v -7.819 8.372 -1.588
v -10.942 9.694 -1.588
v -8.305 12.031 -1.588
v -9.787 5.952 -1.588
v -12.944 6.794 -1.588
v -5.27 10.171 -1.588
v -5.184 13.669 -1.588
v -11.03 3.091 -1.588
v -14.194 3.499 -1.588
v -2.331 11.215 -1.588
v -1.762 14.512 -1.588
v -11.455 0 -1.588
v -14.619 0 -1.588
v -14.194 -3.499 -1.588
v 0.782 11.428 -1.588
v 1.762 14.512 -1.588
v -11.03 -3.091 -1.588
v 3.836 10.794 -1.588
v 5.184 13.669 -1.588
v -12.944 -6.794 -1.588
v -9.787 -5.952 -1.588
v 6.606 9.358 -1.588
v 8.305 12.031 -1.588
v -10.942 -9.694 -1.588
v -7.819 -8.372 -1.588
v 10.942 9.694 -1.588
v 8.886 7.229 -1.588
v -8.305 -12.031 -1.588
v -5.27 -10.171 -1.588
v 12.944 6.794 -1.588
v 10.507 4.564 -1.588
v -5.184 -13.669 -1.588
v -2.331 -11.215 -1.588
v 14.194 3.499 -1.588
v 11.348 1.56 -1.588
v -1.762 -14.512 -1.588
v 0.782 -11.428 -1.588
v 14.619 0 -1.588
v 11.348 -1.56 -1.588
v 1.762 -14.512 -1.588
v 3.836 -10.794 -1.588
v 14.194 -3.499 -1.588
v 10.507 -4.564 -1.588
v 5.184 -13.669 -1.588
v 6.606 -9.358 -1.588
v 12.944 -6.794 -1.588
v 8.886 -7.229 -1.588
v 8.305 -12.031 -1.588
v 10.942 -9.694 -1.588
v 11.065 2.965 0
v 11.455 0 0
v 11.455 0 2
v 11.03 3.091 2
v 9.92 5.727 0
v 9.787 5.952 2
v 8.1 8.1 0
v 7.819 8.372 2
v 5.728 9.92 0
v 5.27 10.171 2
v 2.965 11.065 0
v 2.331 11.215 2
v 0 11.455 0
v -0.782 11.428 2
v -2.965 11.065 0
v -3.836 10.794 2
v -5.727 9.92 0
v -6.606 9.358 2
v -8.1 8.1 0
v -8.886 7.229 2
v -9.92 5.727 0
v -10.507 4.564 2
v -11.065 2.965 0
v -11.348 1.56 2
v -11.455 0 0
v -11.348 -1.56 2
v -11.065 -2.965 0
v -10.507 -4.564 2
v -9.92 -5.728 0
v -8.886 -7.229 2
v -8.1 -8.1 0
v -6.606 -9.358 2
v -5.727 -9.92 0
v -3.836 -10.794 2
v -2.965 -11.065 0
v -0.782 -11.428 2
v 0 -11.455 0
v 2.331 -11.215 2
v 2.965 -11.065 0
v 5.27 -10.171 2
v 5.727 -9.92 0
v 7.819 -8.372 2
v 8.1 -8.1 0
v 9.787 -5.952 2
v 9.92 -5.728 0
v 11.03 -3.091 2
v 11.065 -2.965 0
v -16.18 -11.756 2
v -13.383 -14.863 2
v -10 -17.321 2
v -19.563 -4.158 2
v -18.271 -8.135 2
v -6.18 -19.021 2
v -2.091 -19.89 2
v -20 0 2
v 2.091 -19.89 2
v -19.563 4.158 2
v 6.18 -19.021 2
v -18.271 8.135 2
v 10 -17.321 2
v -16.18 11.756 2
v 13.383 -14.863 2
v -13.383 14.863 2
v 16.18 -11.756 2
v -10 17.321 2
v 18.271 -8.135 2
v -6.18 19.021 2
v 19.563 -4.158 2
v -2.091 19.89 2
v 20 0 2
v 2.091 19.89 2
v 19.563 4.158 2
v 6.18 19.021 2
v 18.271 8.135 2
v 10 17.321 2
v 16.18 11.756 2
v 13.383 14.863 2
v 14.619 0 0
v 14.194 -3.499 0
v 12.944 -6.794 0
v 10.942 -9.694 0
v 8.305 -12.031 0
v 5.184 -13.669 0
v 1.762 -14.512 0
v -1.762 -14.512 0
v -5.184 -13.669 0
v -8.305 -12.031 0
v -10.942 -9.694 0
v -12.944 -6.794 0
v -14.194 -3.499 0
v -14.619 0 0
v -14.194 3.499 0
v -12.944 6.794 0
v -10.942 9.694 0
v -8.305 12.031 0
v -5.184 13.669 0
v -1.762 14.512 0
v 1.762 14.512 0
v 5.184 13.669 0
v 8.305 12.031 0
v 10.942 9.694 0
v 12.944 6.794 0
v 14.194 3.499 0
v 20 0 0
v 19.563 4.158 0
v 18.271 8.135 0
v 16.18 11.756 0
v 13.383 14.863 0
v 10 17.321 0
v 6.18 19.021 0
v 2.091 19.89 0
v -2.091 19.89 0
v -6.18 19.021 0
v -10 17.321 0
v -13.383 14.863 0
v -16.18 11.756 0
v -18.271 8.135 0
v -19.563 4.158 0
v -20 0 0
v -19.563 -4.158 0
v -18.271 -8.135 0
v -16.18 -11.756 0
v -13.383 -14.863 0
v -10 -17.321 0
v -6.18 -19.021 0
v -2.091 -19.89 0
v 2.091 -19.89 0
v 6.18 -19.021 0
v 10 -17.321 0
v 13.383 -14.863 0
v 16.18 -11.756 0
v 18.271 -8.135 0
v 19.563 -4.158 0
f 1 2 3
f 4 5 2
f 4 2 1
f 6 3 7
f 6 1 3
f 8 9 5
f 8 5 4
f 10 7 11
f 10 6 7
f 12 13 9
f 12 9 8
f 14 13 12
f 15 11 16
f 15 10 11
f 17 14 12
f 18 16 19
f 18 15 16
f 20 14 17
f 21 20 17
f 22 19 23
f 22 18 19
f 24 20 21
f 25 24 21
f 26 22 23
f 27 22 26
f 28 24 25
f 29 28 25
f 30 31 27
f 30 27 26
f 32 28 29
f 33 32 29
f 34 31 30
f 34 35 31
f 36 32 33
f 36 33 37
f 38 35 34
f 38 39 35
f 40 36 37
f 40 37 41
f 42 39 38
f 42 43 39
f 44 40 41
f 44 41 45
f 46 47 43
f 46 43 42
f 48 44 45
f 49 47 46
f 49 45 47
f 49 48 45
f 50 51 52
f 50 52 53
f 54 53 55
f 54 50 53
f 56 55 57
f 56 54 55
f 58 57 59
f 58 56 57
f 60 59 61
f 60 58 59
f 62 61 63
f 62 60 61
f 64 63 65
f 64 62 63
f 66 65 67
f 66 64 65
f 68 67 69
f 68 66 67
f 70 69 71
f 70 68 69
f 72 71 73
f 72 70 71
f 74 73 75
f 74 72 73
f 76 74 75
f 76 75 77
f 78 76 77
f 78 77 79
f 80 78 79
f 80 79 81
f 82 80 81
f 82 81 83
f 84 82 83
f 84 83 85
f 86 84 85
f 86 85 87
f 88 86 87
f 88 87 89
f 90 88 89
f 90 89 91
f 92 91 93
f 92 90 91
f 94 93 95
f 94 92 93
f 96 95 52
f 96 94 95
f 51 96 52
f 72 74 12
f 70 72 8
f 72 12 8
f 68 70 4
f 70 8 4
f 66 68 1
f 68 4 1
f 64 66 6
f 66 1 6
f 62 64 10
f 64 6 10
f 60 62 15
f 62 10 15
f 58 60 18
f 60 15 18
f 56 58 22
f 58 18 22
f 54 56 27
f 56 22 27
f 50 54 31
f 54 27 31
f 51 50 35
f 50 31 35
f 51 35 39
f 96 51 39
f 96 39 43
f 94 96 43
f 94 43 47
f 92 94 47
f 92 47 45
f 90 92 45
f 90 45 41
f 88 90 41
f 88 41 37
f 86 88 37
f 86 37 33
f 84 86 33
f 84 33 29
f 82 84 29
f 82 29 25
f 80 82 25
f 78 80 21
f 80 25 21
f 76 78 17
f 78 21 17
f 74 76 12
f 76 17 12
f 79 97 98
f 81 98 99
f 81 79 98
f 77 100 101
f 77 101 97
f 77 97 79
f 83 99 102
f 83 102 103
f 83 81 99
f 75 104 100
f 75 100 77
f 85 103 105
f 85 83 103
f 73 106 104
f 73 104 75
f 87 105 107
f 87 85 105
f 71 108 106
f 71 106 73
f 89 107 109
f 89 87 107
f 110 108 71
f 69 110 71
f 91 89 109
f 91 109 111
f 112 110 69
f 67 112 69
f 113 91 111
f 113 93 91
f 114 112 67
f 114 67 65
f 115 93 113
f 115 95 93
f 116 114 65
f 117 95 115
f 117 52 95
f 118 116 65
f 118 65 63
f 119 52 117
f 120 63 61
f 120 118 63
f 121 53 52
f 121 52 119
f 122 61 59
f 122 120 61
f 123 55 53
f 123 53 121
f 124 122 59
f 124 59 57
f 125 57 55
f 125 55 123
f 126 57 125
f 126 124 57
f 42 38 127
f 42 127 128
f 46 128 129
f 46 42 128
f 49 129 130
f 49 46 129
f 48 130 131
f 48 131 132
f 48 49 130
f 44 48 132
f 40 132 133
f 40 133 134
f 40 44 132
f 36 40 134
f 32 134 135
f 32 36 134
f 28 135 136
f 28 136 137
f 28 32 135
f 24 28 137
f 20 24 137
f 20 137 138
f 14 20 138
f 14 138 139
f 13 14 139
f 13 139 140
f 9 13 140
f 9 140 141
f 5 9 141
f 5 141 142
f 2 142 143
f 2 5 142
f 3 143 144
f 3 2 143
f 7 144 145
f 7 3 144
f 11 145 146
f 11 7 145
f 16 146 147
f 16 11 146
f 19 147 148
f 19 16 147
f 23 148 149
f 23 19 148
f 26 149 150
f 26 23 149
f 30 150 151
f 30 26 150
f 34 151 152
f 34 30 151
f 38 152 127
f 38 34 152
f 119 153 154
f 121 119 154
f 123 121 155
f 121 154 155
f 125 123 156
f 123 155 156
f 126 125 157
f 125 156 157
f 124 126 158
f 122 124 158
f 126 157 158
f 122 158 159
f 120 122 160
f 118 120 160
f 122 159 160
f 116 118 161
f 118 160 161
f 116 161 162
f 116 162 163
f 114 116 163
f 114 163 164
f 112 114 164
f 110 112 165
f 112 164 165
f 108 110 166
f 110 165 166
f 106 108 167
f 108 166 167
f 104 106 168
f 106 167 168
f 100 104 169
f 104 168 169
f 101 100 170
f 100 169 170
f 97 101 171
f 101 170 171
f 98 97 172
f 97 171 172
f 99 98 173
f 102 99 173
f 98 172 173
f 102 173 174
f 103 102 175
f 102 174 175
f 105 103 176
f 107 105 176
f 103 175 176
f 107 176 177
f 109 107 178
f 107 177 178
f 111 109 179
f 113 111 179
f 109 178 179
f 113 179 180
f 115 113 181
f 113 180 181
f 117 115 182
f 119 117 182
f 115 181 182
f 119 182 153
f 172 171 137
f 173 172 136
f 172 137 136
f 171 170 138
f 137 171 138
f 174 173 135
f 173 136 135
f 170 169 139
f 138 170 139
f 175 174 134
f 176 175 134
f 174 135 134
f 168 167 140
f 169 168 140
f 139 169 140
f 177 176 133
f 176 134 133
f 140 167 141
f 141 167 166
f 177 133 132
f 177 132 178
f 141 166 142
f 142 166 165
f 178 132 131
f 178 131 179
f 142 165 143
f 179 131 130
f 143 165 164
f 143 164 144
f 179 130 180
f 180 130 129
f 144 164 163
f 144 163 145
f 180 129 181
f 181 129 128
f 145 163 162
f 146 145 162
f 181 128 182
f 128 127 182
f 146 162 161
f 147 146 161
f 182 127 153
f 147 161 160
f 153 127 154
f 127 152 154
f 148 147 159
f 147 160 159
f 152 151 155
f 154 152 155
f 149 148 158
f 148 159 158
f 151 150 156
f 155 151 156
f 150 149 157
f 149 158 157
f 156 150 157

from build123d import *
from build123d.topology import SkipClean

# Parameters (mm, degrees)
SKETCH1_R           = 20
SKETCH1_R_2         = 14.619
SKETCH1_R_3         = 11.455
BOSS_EXTRUDE1_DEPTH = 2
BOSS_EXTRUDE2_START = 1.5875
SKETCH2_R           = 14.619
SKETCH2_R_2         = 11.455
BOSS_EXTRUDE2_DEPTH = 1.5875


with BuildPart() as part:
    # Sketch1 → Boss-Extrude1 (new body)
    # profile 1 of 2: a face of its own
    with BuildSketch(Plane.XY):
        Circle(SKETCH1_R)
        Circle(SKETCH1_R_2, mode=Mode.SUBTRACT)
    # profile 2 of 2: a face of its own
    with BuildSketch(Plane.XY):
        Circle(SKETCH1_R_2)
        Circle(SKETCH1_R_3, mode=Mode.SUBTRACT)
    extrude(amount=BOSS_EXTRUDE1_DEPTH)

    # Sketch2 → Boss-Extrude2 (add)
    with SkipClean():  # the faces are left unmerged after this step: merging them gives an invalid solid
        with BuildSketch(Plane(origin=(0, 0, 0), x_dir=(-1, 0, 0), z_dir=(0, 0, -1)).offset(BOSS_EXTRUDE2_START)):
            with Locations(Location((0, 0, 0), (0, 0, 180))):
                Circle(SKETCH2_R)
            Circle(SKETCH2_R_2, mode=Mode.SUBTRACT)
        extrude(amount=-BOSS_EXTRUDE2_DEPTH)


solid = part.part
